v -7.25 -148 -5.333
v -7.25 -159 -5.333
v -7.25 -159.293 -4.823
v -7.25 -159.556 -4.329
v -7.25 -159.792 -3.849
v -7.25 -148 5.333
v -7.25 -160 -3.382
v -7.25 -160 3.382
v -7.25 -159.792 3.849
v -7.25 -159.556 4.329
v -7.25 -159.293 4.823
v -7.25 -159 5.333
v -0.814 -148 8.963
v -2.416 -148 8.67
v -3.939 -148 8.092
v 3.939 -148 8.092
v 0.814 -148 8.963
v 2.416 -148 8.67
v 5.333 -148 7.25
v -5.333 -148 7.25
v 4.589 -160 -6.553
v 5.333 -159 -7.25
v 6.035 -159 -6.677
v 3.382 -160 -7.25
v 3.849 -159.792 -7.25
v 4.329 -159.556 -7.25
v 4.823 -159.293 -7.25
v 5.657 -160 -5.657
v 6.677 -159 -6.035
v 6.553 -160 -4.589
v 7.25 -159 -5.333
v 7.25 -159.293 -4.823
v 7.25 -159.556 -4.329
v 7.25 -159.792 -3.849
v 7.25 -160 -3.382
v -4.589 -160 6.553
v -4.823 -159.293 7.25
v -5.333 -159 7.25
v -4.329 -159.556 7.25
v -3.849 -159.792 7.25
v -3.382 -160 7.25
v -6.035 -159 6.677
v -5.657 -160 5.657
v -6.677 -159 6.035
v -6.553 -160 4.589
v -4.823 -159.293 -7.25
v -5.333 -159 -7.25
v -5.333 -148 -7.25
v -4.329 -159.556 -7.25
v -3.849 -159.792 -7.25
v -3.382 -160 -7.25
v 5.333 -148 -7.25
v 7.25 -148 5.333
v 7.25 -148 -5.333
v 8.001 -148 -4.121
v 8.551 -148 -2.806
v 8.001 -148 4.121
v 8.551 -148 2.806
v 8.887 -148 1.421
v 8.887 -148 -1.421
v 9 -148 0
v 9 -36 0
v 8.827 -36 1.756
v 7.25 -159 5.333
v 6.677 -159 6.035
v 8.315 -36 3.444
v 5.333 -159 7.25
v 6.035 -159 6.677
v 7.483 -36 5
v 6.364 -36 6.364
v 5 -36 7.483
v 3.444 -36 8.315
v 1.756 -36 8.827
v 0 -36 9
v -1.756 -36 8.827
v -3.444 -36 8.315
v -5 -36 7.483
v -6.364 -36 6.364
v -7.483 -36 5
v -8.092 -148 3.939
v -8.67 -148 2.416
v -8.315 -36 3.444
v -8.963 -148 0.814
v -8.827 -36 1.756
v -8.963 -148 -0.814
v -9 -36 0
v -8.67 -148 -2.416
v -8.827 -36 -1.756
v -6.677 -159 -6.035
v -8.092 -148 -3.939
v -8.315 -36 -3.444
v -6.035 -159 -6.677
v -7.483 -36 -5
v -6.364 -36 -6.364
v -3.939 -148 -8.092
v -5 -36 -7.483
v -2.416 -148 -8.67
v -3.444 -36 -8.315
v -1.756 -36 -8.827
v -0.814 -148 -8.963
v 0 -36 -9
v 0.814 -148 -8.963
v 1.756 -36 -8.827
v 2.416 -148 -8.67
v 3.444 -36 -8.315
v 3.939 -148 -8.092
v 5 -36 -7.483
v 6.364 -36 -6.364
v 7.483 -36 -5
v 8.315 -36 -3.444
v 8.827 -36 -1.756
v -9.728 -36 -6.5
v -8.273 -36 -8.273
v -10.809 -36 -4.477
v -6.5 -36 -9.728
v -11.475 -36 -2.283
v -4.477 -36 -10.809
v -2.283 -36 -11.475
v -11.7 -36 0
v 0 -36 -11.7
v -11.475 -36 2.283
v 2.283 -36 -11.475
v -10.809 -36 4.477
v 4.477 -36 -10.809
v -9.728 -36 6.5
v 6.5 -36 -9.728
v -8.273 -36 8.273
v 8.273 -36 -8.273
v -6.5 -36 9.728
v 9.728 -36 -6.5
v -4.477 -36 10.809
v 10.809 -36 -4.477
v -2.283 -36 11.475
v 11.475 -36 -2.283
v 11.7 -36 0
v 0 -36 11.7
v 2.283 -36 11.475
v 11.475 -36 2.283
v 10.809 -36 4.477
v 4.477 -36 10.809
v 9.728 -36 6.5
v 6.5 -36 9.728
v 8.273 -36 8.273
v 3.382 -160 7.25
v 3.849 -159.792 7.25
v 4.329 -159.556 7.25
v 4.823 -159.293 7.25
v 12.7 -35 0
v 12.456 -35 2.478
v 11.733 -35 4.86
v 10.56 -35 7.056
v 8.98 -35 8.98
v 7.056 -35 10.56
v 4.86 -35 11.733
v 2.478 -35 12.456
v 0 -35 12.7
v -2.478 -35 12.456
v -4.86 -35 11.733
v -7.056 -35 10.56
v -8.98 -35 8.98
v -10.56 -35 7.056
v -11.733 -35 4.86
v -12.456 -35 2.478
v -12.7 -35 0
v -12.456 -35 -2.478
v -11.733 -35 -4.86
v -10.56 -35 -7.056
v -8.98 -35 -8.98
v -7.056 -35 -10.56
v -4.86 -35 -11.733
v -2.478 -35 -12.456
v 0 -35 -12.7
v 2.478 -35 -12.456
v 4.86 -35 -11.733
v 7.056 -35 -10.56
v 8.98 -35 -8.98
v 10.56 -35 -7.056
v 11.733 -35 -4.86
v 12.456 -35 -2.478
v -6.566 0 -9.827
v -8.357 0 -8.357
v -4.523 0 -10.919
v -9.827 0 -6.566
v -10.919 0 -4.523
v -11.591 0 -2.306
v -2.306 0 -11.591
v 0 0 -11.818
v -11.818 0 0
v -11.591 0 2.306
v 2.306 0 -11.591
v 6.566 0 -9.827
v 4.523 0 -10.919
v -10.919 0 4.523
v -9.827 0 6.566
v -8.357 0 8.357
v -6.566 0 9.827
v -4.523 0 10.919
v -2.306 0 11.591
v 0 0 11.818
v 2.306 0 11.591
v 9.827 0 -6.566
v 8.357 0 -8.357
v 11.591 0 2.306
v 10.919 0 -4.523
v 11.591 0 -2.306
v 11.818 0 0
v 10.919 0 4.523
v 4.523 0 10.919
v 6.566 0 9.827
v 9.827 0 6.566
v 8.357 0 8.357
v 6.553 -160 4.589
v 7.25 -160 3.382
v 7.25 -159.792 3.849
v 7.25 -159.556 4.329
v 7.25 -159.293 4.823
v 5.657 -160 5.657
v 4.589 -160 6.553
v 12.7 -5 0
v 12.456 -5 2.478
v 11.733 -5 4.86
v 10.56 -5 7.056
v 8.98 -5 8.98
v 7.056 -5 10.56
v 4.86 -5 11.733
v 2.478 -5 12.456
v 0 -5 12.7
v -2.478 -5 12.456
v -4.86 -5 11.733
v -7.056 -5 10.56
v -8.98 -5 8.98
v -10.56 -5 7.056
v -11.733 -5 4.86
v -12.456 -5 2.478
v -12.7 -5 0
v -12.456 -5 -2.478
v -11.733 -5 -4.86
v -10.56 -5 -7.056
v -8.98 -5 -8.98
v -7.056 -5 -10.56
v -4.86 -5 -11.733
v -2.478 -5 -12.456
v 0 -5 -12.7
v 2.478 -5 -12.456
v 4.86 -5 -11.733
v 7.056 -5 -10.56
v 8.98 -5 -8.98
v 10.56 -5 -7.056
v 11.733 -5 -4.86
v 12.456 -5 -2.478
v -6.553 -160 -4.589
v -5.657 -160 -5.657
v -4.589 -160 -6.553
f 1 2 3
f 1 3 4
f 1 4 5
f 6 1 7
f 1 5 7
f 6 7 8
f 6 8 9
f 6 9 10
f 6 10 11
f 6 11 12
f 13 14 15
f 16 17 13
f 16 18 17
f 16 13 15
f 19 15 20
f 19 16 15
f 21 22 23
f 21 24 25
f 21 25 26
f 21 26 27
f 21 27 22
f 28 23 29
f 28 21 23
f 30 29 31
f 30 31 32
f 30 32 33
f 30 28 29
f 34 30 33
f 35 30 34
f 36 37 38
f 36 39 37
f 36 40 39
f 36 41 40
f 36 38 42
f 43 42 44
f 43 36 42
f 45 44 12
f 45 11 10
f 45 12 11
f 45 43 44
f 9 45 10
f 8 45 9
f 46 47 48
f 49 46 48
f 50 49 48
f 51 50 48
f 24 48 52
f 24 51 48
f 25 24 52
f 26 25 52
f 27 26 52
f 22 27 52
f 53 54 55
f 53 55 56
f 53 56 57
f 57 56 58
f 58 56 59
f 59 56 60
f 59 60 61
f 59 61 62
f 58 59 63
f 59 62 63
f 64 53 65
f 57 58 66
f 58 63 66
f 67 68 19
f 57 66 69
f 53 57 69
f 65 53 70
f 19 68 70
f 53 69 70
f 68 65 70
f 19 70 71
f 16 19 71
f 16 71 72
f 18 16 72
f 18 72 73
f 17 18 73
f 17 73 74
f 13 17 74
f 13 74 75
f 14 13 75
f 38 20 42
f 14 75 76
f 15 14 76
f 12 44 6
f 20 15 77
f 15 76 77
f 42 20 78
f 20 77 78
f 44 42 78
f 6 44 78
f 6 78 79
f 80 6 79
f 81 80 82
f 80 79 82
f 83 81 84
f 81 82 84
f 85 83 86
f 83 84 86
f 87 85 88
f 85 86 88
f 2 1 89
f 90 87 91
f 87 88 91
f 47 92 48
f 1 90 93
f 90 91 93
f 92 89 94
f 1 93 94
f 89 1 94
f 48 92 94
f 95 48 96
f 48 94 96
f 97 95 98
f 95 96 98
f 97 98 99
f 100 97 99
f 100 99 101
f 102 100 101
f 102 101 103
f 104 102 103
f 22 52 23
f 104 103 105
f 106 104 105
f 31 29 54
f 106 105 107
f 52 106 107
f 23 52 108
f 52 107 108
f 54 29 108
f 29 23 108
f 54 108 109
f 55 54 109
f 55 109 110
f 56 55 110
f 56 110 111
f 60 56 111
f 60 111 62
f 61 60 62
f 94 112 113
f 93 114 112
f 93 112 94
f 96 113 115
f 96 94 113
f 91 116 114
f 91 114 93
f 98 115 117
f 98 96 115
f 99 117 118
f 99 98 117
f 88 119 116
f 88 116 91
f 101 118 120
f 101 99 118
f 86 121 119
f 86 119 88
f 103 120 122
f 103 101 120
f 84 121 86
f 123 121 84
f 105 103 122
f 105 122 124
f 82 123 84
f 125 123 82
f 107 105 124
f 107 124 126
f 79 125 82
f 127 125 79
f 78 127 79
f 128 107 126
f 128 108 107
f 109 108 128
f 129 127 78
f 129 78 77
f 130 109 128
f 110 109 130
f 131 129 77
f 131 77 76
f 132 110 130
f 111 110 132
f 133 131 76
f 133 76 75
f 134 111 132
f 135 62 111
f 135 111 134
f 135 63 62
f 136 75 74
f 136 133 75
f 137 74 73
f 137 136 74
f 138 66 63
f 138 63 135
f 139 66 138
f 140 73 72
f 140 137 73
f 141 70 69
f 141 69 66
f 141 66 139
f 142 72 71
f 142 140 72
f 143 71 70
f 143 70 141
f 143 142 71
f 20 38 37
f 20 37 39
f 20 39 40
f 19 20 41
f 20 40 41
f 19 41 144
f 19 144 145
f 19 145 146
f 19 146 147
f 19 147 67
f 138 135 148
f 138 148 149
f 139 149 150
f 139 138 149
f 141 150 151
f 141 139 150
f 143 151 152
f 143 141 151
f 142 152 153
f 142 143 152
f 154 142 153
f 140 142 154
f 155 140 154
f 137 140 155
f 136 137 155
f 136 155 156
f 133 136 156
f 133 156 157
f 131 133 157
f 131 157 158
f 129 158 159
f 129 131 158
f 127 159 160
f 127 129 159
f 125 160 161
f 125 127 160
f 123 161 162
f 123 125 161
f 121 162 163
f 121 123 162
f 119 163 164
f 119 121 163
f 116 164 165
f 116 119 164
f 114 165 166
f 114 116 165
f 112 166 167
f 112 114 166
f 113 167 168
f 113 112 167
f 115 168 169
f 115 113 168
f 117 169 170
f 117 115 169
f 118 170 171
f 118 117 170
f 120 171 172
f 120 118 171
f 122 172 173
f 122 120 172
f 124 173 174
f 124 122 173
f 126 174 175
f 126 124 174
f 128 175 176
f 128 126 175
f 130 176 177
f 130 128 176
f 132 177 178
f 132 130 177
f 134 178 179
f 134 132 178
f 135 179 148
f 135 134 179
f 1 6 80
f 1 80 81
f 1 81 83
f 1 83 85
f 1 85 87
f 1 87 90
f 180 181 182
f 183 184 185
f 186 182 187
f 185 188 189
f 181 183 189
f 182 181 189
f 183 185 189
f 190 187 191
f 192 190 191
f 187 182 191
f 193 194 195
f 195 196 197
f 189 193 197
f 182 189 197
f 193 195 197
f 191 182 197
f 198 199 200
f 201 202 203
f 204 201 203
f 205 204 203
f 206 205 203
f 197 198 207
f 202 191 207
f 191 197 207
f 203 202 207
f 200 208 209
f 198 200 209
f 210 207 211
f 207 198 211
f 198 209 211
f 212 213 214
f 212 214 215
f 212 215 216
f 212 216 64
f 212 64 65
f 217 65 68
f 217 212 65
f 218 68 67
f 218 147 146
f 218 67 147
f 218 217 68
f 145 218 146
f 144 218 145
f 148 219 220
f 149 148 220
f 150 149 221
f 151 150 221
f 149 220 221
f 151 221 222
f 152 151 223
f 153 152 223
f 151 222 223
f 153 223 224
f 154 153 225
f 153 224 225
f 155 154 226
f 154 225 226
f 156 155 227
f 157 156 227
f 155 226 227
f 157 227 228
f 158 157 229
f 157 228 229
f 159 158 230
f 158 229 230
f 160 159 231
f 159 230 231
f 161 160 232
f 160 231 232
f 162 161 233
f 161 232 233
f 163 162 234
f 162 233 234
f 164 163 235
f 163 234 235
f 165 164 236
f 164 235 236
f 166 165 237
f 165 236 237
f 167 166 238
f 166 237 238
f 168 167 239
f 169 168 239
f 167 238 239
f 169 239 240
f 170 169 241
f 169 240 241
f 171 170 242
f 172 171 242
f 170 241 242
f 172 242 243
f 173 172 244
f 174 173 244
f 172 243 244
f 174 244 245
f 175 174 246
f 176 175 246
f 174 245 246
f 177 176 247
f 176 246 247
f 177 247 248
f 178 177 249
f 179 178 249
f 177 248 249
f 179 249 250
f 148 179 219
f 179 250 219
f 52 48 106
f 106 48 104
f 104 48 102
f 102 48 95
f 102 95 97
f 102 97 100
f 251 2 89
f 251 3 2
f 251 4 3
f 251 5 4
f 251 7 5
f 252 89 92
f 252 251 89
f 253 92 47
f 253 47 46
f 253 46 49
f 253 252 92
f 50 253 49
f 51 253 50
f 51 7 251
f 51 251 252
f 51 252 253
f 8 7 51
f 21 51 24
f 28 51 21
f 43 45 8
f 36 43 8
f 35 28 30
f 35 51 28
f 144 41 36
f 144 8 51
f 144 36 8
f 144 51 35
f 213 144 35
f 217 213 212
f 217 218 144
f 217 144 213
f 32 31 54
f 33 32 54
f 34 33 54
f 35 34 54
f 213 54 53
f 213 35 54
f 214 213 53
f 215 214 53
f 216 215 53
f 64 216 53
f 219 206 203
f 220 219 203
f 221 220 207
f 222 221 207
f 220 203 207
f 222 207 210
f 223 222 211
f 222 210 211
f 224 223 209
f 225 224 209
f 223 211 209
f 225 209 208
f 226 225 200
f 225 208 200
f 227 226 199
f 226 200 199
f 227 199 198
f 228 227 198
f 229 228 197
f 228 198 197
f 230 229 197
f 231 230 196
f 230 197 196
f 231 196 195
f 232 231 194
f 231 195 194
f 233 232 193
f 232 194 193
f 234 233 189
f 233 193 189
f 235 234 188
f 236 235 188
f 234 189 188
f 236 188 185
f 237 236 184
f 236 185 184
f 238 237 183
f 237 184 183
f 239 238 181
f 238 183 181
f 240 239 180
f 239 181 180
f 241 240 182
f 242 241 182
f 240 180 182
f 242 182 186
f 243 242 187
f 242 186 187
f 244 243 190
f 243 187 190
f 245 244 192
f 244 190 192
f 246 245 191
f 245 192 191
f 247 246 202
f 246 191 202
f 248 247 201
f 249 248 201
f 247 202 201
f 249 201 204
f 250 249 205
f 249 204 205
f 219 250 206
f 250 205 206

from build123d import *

# Parameters (mm, degrees)
F0_R     = 9
F1_DEPTH = 160
F2_R     = 12.7
F3_DEPTH = 36
F4_SIZE2 = 0.881635
F4_SIZE  = 5
F5_SIZE  = 1
F6_W     = 18.961538
F6_H     = 20.995473
F6_W_2   = 14.5
F6_H_2   = 14.5
F7_DEPTH = 12


with BuildPart() as f1:
    # F0 (on Front) → F1 (new body)
    with BuildSketch(Plane.XZ):
        Circle(F0_R)
    extrude(amount=F1_DEPTH)

    # F2 (on Front) → F3 (join)
    with BuildSketch(Plane.XZ):
        Circle(F2_R)
    extrude(amount=F3_DEPTH)

    # F4
    f4_edges = [f1.edges().sort_by_distance(p)[0] for p in [
        (-12.7, 0, 0),
    ]]
    chamfer(f4_edges, length=F4_SIZE, length2=F4_SIZE2)

    # F5
    f5_edges = [f1.edges().sort_by_distance(p)[0] for p in [
        (-12.7, -36, 0),
        (-9, -160, 0),
    ]]
    chamfer(f5_edges, length=F5_SIZE)

    # F6 (on face) → F7 (cut)
    with BuildSketch(Plane.XZ.offset(160)):
        with Locations((0, -0.656108)):
            Rectangle(F6_W, F6_H)
        Rectangle(F6_W_2, F6_H_2, mode=Mode.SUBTRACT)
    extrude(amount=-F7_DEPTH, mode=Mode.SUBTRACT)


solid = f1.part
